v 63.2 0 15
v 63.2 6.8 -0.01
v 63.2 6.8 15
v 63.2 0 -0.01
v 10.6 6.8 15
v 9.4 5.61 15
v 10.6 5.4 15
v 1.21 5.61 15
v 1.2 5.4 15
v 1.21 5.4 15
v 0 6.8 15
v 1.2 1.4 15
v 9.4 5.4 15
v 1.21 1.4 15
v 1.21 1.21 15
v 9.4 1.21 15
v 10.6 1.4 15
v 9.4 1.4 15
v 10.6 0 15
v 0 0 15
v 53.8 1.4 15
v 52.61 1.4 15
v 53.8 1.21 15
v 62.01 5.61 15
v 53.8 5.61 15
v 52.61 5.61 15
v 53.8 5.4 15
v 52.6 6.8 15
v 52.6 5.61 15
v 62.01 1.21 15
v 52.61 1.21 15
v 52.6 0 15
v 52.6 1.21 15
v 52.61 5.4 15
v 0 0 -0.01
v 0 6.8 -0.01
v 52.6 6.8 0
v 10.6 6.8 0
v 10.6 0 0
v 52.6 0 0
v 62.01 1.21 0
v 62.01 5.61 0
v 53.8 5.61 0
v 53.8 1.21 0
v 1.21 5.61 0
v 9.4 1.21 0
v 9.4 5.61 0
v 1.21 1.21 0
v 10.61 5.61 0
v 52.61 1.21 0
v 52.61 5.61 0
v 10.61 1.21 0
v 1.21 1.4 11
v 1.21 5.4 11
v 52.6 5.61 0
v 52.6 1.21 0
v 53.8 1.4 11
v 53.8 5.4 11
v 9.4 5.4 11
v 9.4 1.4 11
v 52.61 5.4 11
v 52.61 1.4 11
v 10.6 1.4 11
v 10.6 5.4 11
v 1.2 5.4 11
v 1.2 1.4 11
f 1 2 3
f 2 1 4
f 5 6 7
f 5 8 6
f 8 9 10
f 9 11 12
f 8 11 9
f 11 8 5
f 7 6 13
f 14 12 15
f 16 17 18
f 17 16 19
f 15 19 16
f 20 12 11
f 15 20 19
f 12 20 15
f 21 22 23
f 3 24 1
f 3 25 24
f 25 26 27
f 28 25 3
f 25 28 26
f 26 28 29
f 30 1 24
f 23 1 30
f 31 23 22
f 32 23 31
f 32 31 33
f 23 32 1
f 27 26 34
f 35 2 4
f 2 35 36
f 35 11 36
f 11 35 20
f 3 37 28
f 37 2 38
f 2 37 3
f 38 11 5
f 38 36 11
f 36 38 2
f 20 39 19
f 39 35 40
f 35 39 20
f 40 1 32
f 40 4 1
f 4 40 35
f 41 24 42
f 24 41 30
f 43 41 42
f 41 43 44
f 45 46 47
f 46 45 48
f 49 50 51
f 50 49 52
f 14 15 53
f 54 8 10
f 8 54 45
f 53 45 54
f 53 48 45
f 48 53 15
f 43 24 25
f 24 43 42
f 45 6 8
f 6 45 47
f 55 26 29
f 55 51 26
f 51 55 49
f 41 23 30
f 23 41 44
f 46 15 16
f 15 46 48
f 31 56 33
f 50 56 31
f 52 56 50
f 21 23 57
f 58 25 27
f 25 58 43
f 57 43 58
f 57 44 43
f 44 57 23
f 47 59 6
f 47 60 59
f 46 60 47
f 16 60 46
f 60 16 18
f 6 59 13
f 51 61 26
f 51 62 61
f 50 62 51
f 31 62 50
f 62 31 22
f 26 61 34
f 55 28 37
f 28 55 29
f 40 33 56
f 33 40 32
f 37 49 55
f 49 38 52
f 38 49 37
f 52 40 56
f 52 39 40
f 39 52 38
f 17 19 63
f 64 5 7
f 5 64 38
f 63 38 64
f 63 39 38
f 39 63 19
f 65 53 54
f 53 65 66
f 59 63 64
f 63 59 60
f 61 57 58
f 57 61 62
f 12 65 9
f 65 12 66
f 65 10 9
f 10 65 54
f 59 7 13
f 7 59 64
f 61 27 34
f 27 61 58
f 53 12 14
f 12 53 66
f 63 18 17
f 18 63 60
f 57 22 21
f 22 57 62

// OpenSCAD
// file: ../Base/Boxes.scad
// Fischertechnik Box Foundation
// Pre-designed Boxes

use <Constants.scad>

include <PlacementOptions.scad>

box190Width = 190;
box190Depth = 130;
box130Width = 130;
box130Depth = 95;

// Values are from an original ec3 box
topBottomDifference = 1.5;
outerHeight = 40;
baseThickness = 1.8;
innerHeight = outerHeight - baseThickness;
stackExcess = 5.7;
radius = 3.5;
wallThickness = 1.5;
tolerance = 0.2;

boxWallThickness = wallThickness;
boxBaseThickness = baseThickness;
boxWebWidth = 3.0;

// getBoxWallThickness()
// Gets the wall thickness of a Fischertechnik Box
function getBoxWallThickness() = boxWallThickness;

// getBoxUsageHeight(height = 38.2)
// Gets the usable height of a Fischertechnik box
// height = Outer height of the box from the bottom to the upper edge.
function getBoxUsageHeight(height = outerHeight) = height - baseThickness - stackExcess;

// getBoxInnerHeight()
// Gets the inner height of a Fischertechnik box, including the stack excess
function getBoxInnerHeight() = innerHeight;

// getBoxBaseThickness()
// Gets the thickness of the Fischertechnik box base.
function getBoxBaseThickness() = boxBaseThickness;

// getBoxWebWidth()
// Gets the width of a box web
function getBoxWebWidth() = boxWebWidth;

// getBox190Space()
// Gets the usable inner space of a Box 190 as an x/y-list
function getBox190Space() = [
    box190Width - 2*getBoxWallThickness() - topBottomDifference, 
    box190Depth - 2*getBoxWallThickness() - topBottomDifference ];

// RoundedCornerPlate(width, depth, height, radius)
// Creates a body plate with rounded corners for a box. Used
// also to create the complete box with the hull module.
// width = Width of the plate
// depth = depth of the plate 
// height = thickness of the plate
// radius = radius of the rounded corner
module RoundedCornerPlate(width, depth, height, radius) {
    translate([radius, radius])
    hull() {
        w = width-2*radius;
        d = depth-2*radius;
        cube([w, d, height]);
        cylinder(height, r=radius, $fn=getFragments());
        translate([w, 0])
            cylinder(height, r=radius, $fn=getFragments());
        translate([w, d])
            cylinder(height, r=radius, $fn=getFragments());
        translate([0, d])
            cylinder(height, r=radius, $fn=getFragments());
    }
}

// BoxBase(width, depth)
// Creates an empty stackable Fischertechnik compatible box
// width = Outer width of the box (190, 130, ...)
// depth = Outer depth of the box (130, 95, ...)

module BoxBase(width, depth, height=outerHeight) {    
    thinPlate = 0.01;

    innerHeight = height - baseThickness;    
    
    module Body(tolerance=tolerance) {
        hull() {
            // Bottom with tolerance to fit into the original boxes when stacked
            translate([-wallThickness+tolerance, -wallThickness+tolerance, -baseThickness])
                RoundedCornerPlate(width-topBottomDifference-2*tolerance, depth-topBottomDifference-2*tolerance, thinPlate, radius);
            
            // Top
            translate([-wallThickness-topBottomDifference/2, -wallThickness-topBottomDifference/2, innerHeight-thinPlate])
                RoundedCornerPlate(width, depth, thinPlate, radius);
         }
    }

    module Cutoff() {
        hull() {
            coWidth = width - 2*wallThickness;
            coDepth = depth - 2*wallThickness;
            
            // Bottom
            RoundedCornerPlate(coWidth-topBottomDifference, coDepth-topBottomDifference, thinPlate, radius);

            // Top
            translate([-topBottomDifference/2, -topBottomDifference/2, innerHeight+thinPlate]) 
                RoundedCornerPlate(coWidth, coDepth, thinPlate, radius);
        }
    }
    
    difference() {        
        Body();
        Cutoff();
        stackOffset = innerHeight - stackExcess;
        translate([0, 0, stackOffset + baseThickness])
            Body(tolerance=0);
    }
}

// Creates the Fischertechnik empty box 130x190 mm and places it at position 0,0
// 190x130 are the outer sizes, the inner space is slightly smaller. Use getBox190Space() to get the inner sizes.
// The box is positioned that the usable inner space is at the 0,0,0 position.

module Box190() {
    BoxBase(box190Width, box190Depth);
}

// Gets the usable inner space of a Box 130 as an x/y-list
function getBox130Space() = [
    box130Width - 2*getBoxWallThickness() - topBottomDifference, 
    box130Depth - 2*getBoxWallThickness() - topBottomDifference ];

// Creates the Fischertechnik empty box 95x130 mm and places it at position 0,0
// 190x130 are the outer sizes, the inner space is slightly smaller. Use getBox190Space() to get the inner sizes.
// The box is positioned that the usable inner space is at the 0,0,0 position.

module Box130() {
    BoxBase(box130Width, box130Depth);
}

// Creates a web at the specified box walls
// corner 0 = LowerLeft, 1 = UpperLeft, 2 = UpperRight, 3 = LowerRight
// side 0 = LeftOfCorner, 1 = RightOfCorner
// distance = Distance in mm from the corner
// boxSpace = inner width and depth of the box (default: Box 190)
// webWidth = length of the web (default is 3 mms)
// webThickness = thickness of the web (default is 1 mm)
// height = Height of the web (standard is getBoxUsageHeight())
// sink = How much of the web is sunk into the wall

module BoxWeb(
    corner, 
    side, 
    distance, 
    boxSpace=getBox190Space(), 
    webWidth=getBoxWebWidth(), 
    webThickness=1.0, 
    height=getBoxUsageHeight(),
    sink = getBoxWallThickness()/2) {
    width = (corner % 2 == 0) ? 
            (side == LeftOfCorner ? webWidth : webThickness) :
            (side == LeftOfCorner ? webThickness : webWidth);

    depth = (corner % 2 == 0) ? 
            (side == RightOfCorner ? webWidth : webThickness) :
            (side == RightOfCorner ? webThickness : webWidth);
    
    xDiff = corner == LowerLeft ? 
                (side == LeftOfCorner ? -sink : distance) :
            (corner == UpperLeft ?                
                (side == LeftOfCorner ? distance : -sink) :
            (corner == UpperRight ?
                (side == LeftOfCorner ? boxSpace.x-webWidth+sink : boxSpace.x-distance-webThickness) :
                (side == LeftOfCorner ? boxSpace.x-distance-webThickness: boxSpace.x-webWidth+sink)));

    yDiff = corner == LowerLeft ? 
                (side == RightOfCorner ? -sink : distance) :
            (corner == UpperLeft ?
                (side == RightOfCorner ? boxSpace.y-distance-webThickness : boxSpace.y-webWidth+sink) :
            (corner == UpperRight ?
                (side == RightOfCorner ? boxSpace.y-webWidth+sink : boxSpace.y-distance-webThickness) :
                (side == RightOfCorner ? distance : -sink)));
    
    translate([xDiff, yDiff, -getExcess()])
        cube([width, depth, height + 2*getExcess()]);
}
// file: ../Base/Rotation.scad
// Fischertechnik Box Foundation
// Geometry Helpers Rotation

include <PlacementOptions.scad>

// getRotatedSpace(space, rotation=NoRotation)
// Rotates the space dependent on the specified rotation

function getRotatedSpace(space, rotation=NoRotation) = [
    (rotation == Rotate90 || rotation == Rotate270) ? space.y : space.x,
    (rotation == Rotate90 || rotation == Rotate270) ? space.x : space.y
];

// Rotates the given space around the fixed left lower corner
// space = the space the children needs as width/depth list [width,depth]
// rotation = 0 Rotate0 degrees, 1 Rotate90 degrees, 2 Rotate180 degrees, 3 Rotate270 degrees (equivalent to -90)

module RotateFix(space, rotation=NoRotation) {
    dy = (rotation == Rotate0 || rotation == Rotate270) ? 0 :
        (rotation == Rotate90) ? space.x :
        space.y;
    dx = (rotation < Rotate180) ? 0 :
        (rotation == Rotate180) ? space.x :
        space.y;
    
    translate([dx, dy, 0])
        rotate([0, 0, rotations[rotation]])
            children();
}
// file: ../Base/Alignment.scad
// Fischertechnik Box Foundation
// Geometry Helpers Alignment

include <PlacementOptions.scad>

// getAlignedX(elementWidth, spaceWidth, align=AlignRight, offset=0)
// Gets the aligned X offset of an element with the given
// width in the given space.
// elementWidth = The width of the element to positon
// spaceWidth = The space where the element should be aligned
// align = 0 AlignLeft, 1 AlignCenter, 2 AlignRight
// offset = an optional offset from the aligned position. When
// aligned left or centered, then positive values are in X direction.
// When aligned right then positive values are in negative X direction.

function getAlignedX(elementWidth, spaceWidth, align=AlignRight, offset=0) =
    (align == AlignLeft) ?
        offset :
        ((align == AlignCenter) ?
        (spaceWidth - elementWidth)/2 + offset :
        spaceWidth - offset - elementWidth);

// getAlignedY(elementDepth, spaceDepth, align=AlignTop, offset=0)
// Gets the aligned Y offset of an element with the given
// depth in the given space.
// elementDepth = The depth of the element to positon
// spaceDepth = The space where the element should be aligned
// align = 0 AlignBottom, 1 AlignCenter, 2 AlignTop
// offset = an optional offset from the aligned position. When
// aligned bottom or centered, then positive values are in Y direction.
// When aligned top then positive values are in negative Y direction.

function getAlignedY(elementDepth, spaceDepth, align=AlignTop, offset=0) =
    (align == AlignBottom) ?
        offset :
        ((align == AlignCenter) ?
        (spaceDepth - elementDepth)/2 + offset :
        spaceDepth - offset - elementDepth);
// file: ../Base/PlacementOptions.scad
// Fischertechnik Box Foundation
// Placement Options

// Alignment
NoAlign = 0;
AlignLeft = 1;
AlignBottom = 2;
AlignCenter = 3;
AlignRight = 4;
AlignTop = 5;

// Element rotation degree steps
rotations = [0, -90, -180, -270];

// Rotation
NoRotation = 0;
Rotate0 = 0;
Rotate90 = 1;
Rotate180 = 2;
Rotate270 = 3;

// Docking (seen from above)
NoDock = -1;
DockLeft = 0;
DockTop = 1;
DockRight = 2;
DockCorner = 2;
DockBottom = 3;

// Web corners
LowerLeft = 0;
UpperLeft = 1;
UpperRight = 2;
LowerRight = 3;

// Web position relative to corner
LeftOfCorner = 0;
RightOfCorner = 1;

// Rails direction
Horizontal = true;
Vertical = false;
// file: ../Base/Placement.scad
// Fischertechnik Box Foundation
// Geometry Helpers Placement

use <Constants.scad>
use <Alignment.scad>
use <Rotation.scad>
use <Boxes.scad>

include <PlacementOptions.scad>

// Place(x=0, y=0, elementSpace=[0,0], alignX=AlignLeft, alignY=AlignBottom, rotation=Rotate0, boxSpace=getBox190Space())
// Places the child at the specified position
// y = Y-Position. This is a relative position when an X aligment is specified.
// x = X-Position. This is a relative position when an Y aligment is specified.
// elementSpace = space of the element to be placed [x,y]
// alignX = -1=NoAlign, 0 AlignLeft, 1 AlignCenter, 3 AlignRight (elementSpace and boxSpace required!)
// alignY = -1=NoAlign, 2 AlignBottom, 1 AlignCenter, 4 AlignTop (elementSpace and boxSpace required!)
// rotation = 0 Rotate0 0 degrees, 1 Rotate90 90 degrees, 
// 2 Rotate180 180 degrees, 3 Rotate270 270 degrees (equivalent to -90)
// boxSpace = Inner space of the box where the placement occurs [x,y] - default is Box 190x130 inner space

module Place(x=0, y=0, elementSpace=[0,0], 
  alignX=AlignLeft, alignY=AlignBottom, 
  rotation=NoRotation, boxSpace=getBox190Space()) {

    module Position(x, y, space, rotation=Rotate0) {
        translate([x, y, 0])
            RotateFix(space, rotation)
                children();
    }

    space = getRotatedSpace(elementSpace, rotation);
    alignedX = getAlignedX(space.x, boxSpace.x, alignX, x);
    alignedY = getAlignedY(space.y, boxSpace.y, alignY, y);
    Position(alignedX, alignedY, elementSpace, rotation)
        children();
}

// Center(space=getBox130Space(), elementSpace=[0,0])
// space = Space where the children is centered. For cylinder use centered=true and no elementSpace.
// elementSpace = space of the element to be centered [x,y]

module Center(space=getBox190Space(), elementSpace=[0,0]) {
    Place(elementSpace=elementSpace, boxSpace=space, alignX=AlignCenter, alignY=AlignCenter)
        children();
}

// CenterHorizontal(width=0, y=0, offset=0, space=getBox130Space())
// width = Width of the element to be placed.
// y = Y position of the element
// offset = Offset from the center position (negative will be left of the center)
// space = Space where the element is placed

module CenterHorizontal(width=0, y=0, offset=0, space=getBox190Space()) {
    Place(x=offset, y=y, elementSpace=[width, 0], boxSpace=space, alignX=AlignCenter)
        children(0);
}

// CenterVertical(depth=0, x=0, offset=0, space=getBox130Space())
// depth = Depth of the element to be placed.
// x = X position of the element
// offset = Offset from the center position (negative will be down of the center)
// space = Space where the element is placed

module CenterVertical(depth=0, x=0, offset=0, space=getBox190Space()) {
    Place(x=x, y=offset, elementSpace=[0, depth], boxSpace=space, alignY=AlignCenter)
        children(0);
}

// getIsVertical(align)
// True if the specified alignment needs a vertical orientation for a divider (AlignRight, AlignLeft)

function getIsVertical(align) = (align == AlignRight || align == AlignLeft);

// getIsHorizontal(align)
// True if the specified alignment needs a horizontal orientation for a divider (AlignTop, AlignBottom)

function getIsHorizontal(align) = (align == AlignTop || align == AlignBottom);
// file: ../Base/Constants.scad
// Fischertechnik Box Foundation
// Constants

// Constant values necessary for multiple elements

// Base constants
dividerThickness = 1.2;
excess = 0.01;
fragments = 90;
tolerance = 0.8;

// Gets the thickness of a divider 
function getDividerThickness() = dividerThickness;

// Gets the excess that is used to merge walls into each other
function getExcess() = excess;

// Gets amount of fragments of a cylinder
function getFragments() = fragments;

// Gets the inner tolerance of a frame to each side
function getTolerance() = tolerance;


// Fischertechnik specific constants
axisDiameter = 4;
axisBottomDiameter = axisDiameter + 1;
axisTolerance = 0.2;
axisLockingLength = 8;

// Gets axis diameter of Fischertechnik axis
function getAxisDiameter() = axisDiameter;

// Gets axis diameter tolerance (subtracted for element axis)
function getAxisTolerance() = axisTolerance;

// Gets the axis diameter for standing axis
function getStandAxisDiameter() = getAxisDiameter() - getAxisTolerance();

// Gets axis bottom diameter for thicker part at the bottom
function getAxisBottomDiameter() = axisBottomDiameter;

// Gets the lengthh of the locking part of a locking axis
function getAxisLockingLength() = axisLockingLength;

// Studs

studHeight = 2.5;
studTolerance = 0.2;
studRailDistance = 9;   // as in ft 50

// gets the height of a connecting stud
function getStudHeight() = studHeight;

// gets the connecting stud height tolerance
function getStudTolerance() = studTolerance;

// gets the default rail distance for studs
function getStudRailDistance() = studRailDistance;

// Dockable Frame with Edge

standardEdgeDistance = 2.5;
standardWebDistance = 11.5;
standardCornerLength = 15;

// gets the standard distance to the wall of the box for dockable frames with webs
function getStandardEdgeDistance() = standardEdgeDistance;

// gets the standard distance of each web to the corner of the dockable frame
function getStandardWebDistance() = standardWebDistance;

// gets the standard length of the corner walls of a dockable frame
function getStandardCornerLength() = standardCornerLength;

// Tubes

tubeWallFactor = 0.8;

// gets the wall thickness of a tube.
function getTubeWallThickness() = tubeWallFactor * getDividerThickness();

// Small Parts and Divider Frame

smallPartsFrameHeight = 20;

// gets the frame height for docked small parts boxes.
function getSmallPartsFrameHeight() = smallPartsFrameHeight;

// Hubs

hubRingDiameter = 19.5;
hubRingLevelDiameter = 21;

// gets the diameter of a tube matching the inner ring of a wheel
function getHubRingDiameter() = hubRingDiameter;

// gets the diameter of a hub tube with a thicker diameter
function getHubRingLevelDiameter() = hubRingLevelDiameter;

// Struts

strutAddLength = 9.0;
strutDepth = 8.0;

// gets the full length of a strut
function getFullStrutLength(length) = length + strutAddLength;

// gets the radius of the end of a strut
function getStrutEndRadius() = strutAddLength / 2;

// gets the the depth of a strut
function getStrutDepth() = strutDepth;

// Propeller

propellerAxisDiameter = 7.0;
propellerAxisTolerance = 0.2;

// gets the propeller axis outer diameter
function getPropellerAxisDiameter() = propellerAxisDiameter;

// gets the propeller axis printing tolerance
function getPropellerAxisTolerance() = propellerAxisTolerance;
// main file
// Fischertechnik Box Library
// Frame for single 60 mm Axis
// 31032, 35065

use <../ModelBase/Complex.scad>

/* [Element Parameters] */
count = 1;

/* [Hidden] */
length = 60;

// getFrameAxis60Space(count=1)
// Gets the width (.x) and depth (.y) of the axis frame.
// count = Count of axis

function getFrameAxis60Space(count=1) = getFrameAxisSpace(length, count);

// FrameAxis60(count=1)
// Axis holder for a single 60 mm axis.
// count = Count of axis

module FrameAxis60(count=1) {
    FrameAxis(length, count);
}

// Test
color("lightgray")
FrameAxis60(count);
